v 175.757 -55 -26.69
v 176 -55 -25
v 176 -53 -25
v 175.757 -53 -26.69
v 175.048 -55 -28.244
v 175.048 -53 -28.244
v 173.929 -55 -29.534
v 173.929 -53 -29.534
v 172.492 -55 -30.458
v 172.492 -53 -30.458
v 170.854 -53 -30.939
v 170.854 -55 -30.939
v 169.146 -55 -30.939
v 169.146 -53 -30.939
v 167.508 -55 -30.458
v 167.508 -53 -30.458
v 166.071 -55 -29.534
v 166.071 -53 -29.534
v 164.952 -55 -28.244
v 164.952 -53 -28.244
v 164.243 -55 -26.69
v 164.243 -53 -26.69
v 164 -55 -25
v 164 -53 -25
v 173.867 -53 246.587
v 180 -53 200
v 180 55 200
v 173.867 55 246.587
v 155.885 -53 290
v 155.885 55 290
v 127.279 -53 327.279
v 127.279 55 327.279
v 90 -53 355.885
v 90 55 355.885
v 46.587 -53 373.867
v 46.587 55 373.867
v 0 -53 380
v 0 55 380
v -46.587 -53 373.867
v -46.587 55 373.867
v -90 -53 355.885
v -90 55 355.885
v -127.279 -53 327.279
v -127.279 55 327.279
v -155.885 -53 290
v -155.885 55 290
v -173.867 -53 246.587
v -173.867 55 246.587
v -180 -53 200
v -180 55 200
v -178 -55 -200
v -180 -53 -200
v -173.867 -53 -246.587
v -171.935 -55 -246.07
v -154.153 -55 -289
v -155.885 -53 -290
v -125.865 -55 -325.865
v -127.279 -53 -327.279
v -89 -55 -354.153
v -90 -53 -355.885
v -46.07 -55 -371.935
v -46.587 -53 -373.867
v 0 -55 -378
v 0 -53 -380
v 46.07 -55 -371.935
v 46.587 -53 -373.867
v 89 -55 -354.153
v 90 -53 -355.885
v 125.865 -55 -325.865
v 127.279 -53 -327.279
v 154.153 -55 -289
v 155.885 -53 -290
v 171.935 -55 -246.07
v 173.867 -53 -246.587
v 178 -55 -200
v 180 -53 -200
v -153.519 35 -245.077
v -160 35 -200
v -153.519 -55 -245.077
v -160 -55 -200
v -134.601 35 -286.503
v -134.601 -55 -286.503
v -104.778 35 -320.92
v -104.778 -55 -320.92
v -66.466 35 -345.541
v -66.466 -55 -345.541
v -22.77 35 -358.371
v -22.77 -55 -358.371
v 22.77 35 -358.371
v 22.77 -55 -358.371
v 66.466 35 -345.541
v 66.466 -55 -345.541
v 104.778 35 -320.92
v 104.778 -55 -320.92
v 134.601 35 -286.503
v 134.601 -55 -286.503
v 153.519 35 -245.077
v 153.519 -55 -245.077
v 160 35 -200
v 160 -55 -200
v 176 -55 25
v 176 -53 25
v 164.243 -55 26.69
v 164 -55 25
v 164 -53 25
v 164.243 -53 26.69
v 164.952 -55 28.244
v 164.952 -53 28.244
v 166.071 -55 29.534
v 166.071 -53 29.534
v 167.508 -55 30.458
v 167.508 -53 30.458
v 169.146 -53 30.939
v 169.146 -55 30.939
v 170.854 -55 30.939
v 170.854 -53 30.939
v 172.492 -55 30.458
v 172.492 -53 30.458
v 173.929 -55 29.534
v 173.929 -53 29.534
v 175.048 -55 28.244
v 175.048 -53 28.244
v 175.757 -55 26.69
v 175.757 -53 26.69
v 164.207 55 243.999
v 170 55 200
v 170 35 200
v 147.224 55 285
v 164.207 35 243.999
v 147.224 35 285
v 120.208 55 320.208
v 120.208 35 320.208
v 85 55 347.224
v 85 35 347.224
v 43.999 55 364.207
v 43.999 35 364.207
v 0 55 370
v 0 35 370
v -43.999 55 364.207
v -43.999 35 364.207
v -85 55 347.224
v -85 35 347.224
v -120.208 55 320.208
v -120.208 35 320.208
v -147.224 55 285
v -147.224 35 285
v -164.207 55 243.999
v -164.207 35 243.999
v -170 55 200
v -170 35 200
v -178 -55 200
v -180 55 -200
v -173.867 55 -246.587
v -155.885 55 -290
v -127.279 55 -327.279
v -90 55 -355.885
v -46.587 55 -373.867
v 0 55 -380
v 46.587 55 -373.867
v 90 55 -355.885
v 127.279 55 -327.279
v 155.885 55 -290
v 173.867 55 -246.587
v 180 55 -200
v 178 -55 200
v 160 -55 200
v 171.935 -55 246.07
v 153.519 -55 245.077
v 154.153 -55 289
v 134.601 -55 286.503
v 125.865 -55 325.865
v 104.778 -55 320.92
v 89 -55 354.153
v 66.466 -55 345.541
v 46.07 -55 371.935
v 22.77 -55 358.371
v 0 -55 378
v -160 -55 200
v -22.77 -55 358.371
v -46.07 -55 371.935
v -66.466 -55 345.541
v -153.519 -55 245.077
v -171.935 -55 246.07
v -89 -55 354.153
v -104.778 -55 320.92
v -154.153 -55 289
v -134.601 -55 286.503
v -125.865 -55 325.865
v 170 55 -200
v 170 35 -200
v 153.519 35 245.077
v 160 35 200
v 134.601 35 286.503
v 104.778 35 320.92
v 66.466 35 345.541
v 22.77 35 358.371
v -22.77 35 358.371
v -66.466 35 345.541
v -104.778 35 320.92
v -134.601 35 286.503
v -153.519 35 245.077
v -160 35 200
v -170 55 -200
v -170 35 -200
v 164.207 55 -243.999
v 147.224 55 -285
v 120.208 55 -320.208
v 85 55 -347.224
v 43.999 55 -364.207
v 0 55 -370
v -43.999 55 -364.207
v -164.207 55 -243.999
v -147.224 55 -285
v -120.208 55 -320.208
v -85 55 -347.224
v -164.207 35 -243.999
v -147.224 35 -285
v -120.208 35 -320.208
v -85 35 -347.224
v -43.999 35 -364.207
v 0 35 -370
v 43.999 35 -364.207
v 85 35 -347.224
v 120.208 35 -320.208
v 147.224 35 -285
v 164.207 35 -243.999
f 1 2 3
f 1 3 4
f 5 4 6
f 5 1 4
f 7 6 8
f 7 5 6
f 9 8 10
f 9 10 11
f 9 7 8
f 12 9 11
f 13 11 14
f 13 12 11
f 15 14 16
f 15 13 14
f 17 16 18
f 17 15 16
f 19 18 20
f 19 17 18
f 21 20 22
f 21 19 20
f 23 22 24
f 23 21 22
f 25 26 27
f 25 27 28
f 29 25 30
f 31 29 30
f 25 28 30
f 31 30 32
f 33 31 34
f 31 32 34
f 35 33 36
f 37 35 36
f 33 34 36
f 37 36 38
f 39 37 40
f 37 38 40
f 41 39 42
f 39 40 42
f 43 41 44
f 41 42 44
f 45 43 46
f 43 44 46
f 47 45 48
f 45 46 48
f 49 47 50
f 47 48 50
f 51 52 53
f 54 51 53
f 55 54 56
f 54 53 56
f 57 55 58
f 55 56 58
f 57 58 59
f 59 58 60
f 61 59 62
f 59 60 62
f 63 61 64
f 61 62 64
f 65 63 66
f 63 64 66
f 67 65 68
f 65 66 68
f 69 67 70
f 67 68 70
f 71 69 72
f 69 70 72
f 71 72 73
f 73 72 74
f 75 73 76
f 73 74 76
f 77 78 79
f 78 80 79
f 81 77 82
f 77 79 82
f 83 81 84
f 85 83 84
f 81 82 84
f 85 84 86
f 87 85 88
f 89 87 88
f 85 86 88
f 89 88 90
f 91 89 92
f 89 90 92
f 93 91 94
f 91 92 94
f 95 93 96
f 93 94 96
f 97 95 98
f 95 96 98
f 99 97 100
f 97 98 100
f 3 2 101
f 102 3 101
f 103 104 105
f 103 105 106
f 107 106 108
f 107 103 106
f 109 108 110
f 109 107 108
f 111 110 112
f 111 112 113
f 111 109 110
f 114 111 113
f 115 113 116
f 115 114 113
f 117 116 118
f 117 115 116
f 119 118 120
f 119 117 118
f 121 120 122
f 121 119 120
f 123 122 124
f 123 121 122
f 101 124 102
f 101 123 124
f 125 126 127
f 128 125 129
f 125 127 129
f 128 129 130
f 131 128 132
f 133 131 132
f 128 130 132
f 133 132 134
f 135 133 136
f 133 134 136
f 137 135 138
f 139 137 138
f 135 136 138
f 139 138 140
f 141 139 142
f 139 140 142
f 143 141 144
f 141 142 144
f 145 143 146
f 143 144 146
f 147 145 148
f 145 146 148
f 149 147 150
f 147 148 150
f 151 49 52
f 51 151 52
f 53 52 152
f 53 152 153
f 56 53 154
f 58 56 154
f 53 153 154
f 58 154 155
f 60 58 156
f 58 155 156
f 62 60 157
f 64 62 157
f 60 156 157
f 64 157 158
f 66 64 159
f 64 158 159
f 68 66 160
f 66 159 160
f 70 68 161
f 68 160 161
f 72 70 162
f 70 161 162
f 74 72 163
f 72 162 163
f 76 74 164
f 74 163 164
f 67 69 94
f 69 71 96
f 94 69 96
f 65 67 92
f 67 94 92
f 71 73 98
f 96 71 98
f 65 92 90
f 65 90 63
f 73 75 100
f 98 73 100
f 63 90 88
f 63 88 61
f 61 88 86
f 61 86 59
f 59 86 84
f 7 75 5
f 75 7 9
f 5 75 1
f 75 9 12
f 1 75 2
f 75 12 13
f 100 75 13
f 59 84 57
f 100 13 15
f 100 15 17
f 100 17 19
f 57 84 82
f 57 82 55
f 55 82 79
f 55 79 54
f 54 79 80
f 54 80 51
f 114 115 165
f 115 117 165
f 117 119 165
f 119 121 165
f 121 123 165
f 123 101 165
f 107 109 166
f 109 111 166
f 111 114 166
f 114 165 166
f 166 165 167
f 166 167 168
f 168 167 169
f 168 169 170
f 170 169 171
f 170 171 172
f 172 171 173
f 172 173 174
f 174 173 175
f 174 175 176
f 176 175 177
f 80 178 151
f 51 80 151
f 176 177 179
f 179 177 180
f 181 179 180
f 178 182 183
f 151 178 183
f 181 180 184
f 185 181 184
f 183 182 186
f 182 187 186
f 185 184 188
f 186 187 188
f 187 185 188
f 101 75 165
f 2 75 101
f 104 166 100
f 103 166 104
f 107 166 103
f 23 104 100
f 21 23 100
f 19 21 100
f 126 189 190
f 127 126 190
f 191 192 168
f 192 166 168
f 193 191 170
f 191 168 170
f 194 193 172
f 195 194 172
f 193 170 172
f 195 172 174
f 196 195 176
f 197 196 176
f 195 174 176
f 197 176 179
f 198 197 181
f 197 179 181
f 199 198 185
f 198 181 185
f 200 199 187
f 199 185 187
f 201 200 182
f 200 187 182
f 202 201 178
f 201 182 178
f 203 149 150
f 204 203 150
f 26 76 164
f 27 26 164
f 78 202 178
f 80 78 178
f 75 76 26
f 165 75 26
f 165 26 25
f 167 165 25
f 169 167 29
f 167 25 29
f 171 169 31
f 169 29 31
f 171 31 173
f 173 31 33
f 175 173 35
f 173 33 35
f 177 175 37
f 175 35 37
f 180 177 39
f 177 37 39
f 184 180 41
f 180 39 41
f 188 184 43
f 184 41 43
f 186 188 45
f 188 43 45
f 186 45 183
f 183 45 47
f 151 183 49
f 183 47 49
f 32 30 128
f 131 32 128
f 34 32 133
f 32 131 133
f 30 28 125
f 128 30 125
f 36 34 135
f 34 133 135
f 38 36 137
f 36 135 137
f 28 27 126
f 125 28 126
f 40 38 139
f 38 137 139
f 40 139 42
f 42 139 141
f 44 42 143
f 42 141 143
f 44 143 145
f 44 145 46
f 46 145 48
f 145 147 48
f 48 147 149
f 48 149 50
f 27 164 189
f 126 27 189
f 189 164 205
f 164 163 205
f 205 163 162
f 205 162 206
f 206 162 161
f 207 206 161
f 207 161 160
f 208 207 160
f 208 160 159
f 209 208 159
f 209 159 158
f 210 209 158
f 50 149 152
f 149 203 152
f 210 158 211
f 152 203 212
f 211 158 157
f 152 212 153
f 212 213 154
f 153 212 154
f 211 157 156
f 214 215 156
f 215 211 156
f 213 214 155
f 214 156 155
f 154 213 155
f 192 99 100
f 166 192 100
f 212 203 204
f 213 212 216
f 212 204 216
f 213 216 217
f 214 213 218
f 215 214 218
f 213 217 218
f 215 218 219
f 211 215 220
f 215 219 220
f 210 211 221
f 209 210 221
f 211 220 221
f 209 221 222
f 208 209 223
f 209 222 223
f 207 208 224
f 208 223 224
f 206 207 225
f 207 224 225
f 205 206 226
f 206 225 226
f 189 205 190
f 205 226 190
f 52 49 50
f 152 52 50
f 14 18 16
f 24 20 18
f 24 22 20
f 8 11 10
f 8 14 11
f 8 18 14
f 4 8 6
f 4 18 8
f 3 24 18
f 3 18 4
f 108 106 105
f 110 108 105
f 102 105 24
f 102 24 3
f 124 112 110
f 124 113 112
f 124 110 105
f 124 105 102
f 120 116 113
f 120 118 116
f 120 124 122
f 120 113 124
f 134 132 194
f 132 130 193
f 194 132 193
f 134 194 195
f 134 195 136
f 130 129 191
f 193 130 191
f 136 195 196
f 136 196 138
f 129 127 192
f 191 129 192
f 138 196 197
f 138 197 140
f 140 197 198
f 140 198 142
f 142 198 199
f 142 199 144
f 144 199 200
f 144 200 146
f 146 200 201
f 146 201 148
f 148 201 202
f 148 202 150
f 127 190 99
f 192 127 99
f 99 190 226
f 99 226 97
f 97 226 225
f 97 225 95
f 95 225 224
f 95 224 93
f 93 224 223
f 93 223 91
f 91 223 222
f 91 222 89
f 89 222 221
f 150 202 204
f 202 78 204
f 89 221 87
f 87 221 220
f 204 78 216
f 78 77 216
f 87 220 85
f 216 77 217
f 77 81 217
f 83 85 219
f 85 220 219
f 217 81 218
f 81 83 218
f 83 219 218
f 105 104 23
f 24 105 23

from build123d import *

# Parameters (mm, degrees)
EXTRUDE023_DEPTH = 2
CHAMFER001_SIZE  = 2


with BuildPart() as doorlockmountplatecutout:
    # Sketch029 → Extrude023 (new body)
    with BuildSketch(Plane(origin=(0, 0, 0), x_dir=(-1, 0, 0), z_dir=(0, 1, 0))):
        with BuildLine():
            Line((6, 25), (6, -25))
            ThreePointArc((-6, -25), (0, -31), (6, -25))
            Line((-6, -25), (-6, 25))
            ThreePointArc((6, 25), (0, 31), (-6, 25))
        make_face()
    extrude(amount=EXTRUDE023_DEPTH)


with BuildPart() as doorlockmountplatecutout_1:
    # Extrude023 placement: moved
    add(doorlockmountplatecutout.part.moved(Location((170, -55, 0))))


with BuildPart() as mainbody:
    # Sweep: sweep along a path in Sketch001
    with BuildLine(Plane.XZ) as sweep_path:
        ThreePointArc((180, 200), (0, 380), (-180, 200))
        Line((-180, 200), (-180, -200))
        ThreePointArc((-180, -200), (0, -380), (180, -200))
        Line((180, -200), (180, 200))
    # Sketch → Sweep (sweep)
    with BuildSketch(Plane.XY):
        Polygon((160, -55), (160, 35), (170, 35), (170, 55), (180, 55), (180, -55), align=None)
    sweep(path=sweep_path.line)

    # Cut001: cut DoorLockMountPlateCutout
    add(doorlockmountplatecutout_1.part, mode=Mode.SUBTRACT)

    # Chamfer001
    chamfer001_edges = [mainbody.edges().sort_by_distance(p)[0] for p in [
        (0, -55, 380),
        (180, -55, 0),
        (-180, -55, 0),
        (0, -55, -380),
    ]]
    chamfer(chamfer001_edges, length=CHAMFER001_SIZE)


solid = mainbody.part
